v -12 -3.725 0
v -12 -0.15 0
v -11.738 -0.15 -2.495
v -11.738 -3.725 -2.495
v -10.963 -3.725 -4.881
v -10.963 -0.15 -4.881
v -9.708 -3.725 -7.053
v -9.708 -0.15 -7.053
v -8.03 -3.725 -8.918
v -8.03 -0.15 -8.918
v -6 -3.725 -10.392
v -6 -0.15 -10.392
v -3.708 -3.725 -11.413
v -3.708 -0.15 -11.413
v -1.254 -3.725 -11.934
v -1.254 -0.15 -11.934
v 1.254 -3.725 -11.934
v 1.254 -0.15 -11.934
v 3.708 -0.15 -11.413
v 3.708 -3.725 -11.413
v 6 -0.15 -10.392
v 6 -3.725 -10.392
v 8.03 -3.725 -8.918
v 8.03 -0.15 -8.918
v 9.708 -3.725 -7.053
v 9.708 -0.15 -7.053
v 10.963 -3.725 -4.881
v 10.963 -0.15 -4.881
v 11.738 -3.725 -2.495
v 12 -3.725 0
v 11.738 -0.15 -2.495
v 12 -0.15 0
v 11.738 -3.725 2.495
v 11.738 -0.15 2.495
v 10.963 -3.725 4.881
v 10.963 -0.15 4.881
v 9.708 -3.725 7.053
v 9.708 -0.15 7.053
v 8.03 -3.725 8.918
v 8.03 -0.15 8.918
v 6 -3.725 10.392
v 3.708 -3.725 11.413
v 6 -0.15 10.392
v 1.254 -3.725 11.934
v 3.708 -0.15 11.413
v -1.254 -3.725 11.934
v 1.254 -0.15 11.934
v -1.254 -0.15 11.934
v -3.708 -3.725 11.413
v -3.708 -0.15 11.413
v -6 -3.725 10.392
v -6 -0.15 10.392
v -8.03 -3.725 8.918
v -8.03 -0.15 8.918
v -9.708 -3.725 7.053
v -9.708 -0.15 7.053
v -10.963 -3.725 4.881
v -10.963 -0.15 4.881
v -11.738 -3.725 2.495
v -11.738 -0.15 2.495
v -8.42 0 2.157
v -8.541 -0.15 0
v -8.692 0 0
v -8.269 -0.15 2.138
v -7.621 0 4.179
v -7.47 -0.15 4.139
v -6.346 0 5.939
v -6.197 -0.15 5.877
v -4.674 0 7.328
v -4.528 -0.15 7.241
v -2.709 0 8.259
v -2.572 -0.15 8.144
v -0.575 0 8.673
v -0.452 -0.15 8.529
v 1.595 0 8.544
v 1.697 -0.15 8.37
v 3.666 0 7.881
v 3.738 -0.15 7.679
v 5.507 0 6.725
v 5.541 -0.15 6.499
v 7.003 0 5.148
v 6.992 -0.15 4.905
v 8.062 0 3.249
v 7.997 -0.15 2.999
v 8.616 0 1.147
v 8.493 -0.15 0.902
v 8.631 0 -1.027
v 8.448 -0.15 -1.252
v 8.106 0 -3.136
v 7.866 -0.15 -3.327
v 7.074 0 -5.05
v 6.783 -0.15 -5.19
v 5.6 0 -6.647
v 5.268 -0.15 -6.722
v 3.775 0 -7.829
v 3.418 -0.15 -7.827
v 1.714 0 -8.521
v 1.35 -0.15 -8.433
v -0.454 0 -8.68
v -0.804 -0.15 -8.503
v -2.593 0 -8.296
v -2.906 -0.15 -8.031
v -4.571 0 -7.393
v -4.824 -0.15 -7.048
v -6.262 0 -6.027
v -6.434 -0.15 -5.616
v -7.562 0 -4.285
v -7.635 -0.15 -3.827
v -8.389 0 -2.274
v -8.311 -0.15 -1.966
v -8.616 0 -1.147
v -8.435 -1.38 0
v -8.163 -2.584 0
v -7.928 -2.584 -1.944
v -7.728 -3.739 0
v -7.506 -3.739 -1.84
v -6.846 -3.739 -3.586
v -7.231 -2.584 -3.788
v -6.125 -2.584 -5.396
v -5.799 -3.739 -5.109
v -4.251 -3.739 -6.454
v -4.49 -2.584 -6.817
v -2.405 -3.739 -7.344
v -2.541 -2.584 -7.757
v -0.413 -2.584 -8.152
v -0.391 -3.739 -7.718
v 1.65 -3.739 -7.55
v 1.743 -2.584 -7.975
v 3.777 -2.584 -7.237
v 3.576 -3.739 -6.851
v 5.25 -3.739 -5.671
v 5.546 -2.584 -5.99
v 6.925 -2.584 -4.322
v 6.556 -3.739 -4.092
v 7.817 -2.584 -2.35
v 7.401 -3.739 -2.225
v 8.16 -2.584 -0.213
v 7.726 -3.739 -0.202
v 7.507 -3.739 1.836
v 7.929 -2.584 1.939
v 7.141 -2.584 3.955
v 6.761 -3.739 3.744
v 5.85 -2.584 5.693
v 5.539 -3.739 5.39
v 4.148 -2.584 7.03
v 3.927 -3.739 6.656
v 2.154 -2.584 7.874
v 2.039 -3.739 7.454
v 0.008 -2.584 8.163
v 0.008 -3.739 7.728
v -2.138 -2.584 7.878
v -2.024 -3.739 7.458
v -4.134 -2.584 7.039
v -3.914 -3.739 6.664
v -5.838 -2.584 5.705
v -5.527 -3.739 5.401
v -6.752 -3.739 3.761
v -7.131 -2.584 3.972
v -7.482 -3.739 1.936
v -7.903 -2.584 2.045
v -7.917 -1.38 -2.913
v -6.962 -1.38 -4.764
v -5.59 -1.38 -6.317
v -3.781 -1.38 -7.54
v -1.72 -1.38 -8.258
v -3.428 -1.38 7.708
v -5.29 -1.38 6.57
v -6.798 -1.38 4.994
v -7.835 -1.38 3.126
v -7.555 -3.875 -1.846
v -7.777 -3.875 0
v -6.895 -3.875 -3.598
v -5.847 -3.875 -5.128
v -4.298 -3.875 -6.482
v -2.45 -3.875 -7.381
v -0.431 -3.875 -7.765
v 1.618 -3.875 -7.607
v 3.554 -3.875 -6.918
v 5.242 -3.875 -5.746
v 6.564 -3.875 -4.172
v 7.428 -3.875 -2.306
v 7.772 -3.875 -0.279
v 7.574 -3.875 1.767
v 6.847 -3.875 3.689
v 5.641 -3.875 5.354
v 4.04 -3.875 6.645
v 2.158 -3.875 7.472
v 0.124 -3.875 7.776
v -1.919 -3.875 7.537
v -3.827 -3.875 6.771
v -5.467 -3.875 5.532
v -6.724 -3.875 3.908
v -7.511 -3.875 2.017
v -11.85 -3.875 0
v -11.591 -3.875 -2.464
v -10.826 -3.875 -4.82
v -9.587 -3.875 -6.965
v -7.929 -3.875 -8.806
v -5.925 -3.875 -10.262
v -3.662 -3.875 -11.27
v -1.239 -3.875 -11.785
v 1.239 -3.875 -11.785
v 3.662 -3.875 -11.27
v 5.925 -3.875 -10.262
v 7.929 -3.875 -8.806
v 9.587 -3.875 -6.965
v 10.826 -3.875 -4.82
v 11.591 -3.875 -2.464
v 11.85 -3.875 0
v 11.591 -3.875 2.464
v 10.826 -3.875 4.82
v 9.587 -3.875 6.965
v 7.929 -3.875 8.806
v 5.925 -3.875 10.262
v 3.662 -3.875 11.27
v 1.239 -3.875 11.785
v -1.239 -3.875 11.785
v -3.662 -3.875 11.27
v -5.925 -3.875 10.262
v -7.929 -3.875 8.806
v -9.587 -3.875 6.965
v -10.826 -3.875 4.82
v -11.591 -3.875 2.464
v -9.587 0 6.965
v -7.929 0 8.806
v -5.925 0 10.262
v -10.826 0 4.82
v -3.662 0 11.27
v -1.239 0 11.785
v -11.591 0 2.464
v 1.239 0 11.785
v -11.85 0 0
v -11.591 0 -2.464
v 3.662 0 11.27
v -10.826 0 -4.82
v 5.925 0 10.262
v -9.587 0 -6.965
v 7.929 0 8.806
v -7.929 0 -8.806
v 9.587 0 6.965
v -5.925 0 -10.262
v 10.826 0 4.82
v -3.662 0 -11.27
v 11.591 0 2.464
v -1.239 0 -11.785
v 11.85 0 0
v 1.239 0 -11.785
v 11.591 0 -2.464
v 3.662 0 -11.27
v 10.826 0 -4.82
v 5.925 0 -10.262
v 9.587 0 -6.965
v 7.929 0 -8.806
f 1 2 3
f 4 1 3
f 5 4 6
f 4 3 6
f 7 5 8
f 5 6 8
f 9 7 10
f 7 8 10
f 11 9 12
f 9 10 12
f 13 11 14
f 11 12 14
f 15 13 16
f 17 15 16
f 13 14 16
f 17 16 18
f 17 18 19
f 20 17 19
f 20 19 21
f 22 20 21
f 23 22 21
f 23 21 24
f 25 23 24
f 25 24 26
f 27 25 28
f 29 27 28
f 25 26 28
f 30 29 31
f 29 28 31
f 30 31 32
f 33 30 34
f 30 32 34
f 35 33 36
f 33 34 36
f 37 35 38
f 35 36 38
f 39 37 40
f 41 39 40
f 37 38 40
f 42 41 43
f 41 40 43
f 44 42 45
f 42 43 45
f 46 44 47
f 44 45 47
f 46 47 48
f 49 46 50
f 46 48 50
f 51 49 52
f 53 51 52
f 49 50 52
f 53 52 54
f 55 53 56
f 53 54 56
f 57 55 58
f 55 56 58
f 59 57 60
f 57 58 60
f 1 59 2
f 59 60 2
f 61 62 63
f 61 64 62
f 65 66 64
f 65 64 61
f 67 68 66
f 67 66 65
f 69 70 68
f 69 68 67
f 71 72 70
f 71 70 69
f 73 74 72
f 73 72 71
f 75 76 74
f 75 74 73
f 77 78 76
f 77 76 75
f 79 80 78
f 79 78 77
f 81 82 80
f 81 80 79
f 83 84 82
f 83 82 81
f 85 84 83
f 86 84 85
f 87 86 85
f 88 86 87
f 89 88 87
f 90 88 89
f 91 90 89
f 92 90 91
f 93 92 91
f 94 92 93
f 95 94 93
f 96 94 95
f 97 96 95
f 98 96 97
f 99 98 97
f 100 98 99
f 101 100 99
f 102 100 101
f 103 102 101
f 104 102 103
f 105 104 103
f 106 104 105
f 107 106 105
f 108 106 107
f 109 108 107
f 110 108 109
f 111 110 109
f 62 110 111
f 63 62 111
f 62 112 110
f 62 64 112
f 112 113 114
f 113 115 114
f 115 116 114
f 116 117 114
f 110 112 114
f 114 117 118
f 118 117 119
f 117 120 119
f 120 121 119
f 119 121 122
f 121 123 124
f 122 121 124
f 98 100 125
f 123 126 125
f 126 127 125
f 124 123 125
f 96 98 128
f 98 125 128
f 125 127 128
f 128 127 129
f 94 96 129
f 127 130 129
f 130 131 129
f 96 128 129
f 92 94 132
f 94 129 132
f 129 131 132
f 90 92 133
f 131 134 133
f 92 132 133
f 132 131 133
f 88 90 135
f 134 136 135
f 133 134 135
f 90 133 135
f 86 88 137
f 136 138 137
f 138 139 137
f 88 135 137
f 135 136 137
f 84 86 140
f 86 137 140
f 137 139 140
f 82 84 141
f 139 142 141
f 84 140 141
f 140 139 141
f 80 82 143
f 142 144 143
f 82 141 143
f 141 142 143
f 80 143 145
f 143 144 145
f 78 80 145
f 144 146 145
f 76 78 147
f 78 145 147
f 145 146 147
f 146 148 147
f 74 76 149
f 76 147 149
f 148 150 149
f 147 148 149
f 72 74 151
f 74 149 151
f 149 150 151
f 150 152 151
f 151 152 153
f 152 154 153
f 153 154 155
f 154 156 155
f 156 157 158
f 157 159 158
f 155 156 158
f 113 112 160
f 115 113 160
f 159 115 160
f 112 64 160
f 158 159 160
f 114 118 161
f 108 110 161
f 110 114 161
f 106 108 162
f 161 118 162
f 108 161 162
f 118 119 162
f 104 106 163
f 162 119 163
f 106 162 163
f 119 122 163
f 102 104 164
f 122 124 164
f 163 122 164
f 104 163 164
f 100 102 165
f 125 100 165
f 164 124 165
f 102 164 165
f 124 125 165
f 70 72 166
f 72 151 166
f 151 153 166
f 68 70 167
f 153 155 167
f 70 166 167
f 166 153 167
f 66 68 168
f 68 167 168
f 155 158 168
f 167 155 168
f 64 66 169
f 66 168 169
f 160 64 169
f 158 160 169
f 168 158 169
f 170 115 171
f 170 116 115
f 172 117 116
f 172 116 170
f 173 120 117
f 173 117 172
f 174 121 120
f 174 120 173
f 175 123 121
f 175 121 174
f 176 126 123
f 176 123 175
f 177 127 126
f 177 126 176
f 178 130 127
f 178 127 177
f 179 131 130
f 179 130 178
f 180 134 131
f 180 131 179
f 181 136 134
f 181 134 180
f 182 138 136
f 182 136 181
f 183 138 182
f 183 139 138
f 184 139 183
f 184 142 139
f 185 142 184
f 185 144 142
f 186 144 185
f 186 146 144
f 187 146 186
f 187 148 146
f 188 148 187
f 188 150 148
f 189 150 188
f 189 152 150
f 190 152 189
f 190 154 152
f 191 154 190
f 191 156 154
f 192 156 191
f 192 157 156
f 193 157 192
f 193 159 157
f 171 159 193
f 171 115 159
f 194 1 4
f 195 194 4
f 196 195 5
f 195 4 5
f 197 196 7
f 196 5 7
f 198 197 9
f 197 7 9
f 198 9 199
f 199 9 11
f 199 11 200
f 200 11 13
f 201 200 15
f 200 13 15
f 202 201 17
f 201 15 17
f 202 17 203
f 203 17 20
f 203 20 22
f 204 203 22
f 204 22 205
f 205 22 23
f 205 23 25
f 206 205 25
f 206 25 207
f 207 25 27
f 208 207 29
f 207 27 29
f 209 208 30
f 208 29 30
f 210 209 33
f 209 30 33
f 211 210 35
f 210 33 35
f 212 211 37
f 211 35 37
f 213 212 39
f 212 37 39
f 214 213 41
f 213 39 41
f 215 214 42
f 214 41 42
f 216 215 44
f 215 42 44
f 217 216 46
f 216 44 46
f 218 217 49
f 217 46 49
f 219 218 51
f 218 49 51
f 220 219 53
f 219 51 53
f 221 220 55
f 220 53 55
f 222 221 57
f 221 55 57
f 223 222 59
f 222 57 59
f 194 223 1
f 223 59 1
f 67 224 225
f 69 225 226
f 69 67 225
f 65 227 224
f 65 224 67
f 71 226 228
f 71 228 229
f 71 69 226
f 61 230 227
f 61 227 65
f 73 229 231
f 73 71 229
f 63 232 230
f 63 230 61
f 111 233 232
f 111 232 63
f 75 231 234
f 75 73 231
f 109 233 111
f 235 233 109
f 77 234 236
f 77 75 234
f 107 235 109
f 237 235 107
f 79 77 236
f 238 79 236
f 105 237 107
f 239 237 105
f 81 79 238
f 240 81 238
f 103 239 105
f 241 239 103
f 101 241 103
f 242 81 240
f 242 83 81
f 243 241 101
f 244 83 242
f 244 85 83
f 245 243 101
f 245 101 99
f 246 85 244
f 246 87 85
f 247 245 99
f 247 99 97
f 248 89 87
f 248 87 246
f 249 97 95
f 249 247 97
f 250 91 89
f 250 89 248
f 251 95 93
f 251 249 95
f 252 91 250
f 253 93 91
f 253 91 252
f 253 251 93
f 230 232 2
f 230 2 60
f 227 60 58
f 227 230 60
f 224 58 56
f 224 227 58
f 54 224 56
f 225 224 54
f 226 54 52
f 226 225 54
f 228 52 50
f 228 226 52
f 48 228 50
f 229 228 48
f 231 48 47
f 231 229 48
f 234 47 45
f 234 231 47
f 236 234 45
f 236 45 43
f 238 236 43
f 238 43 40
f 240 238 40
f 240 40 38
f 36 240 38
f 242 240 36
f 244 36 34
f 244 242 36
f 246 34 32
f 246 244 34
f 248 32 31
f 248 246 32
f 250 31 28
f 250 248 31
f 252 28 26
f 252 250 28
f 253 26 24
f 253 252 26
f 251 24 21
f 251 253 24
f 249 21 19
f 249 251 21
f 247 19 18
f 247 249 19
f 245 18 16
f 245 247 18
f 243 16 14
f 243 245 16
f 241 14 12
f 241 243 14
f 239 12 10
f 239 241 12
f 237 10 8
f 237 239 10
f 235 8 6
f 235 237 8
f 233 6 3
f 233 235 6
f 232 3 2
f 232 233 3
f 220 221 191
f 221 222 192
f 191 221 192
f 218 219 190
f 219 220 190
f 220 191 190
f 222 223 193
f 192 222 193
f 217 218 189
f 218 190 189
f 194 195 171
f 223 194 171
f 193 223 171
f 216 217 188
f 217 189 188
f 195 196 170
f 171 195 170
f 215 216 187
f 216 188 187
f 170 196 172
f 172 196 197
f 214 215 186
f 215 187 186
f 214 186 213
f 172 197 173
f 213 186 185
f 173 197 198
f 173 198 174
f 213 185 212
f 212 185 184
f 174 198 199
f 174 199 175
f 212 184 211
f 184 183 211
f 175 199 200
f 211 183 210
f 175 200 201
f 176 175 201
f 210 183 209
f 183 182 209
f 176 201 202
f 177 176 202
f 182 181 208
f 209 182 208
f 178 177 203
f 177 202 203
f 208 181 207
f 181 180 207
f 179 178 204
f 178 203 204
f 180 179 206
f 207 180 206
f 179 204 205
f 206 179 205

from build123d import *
from OCP.BRepFilletAPI import BRepFilletAPI_MakeChamfer

# Parameters (mm, degrees)
CUT_EXTRUDE1_DEPTH      = 18.407344018
CUT_EXTRUDE1_DEPTH_BACK = 18.407344018
SKETCH3_W               = 25.396980305
SKETCH3_H               = 7.254542424
CHAMFER1_SIZE           = 0.15
CHAMFER1_SIZE2          = 0.112518034


with BuildPart() as part:
    # Sketch2 → Revolve1 (revolve)
    with BuildSketch(Plane.XY):
        with BuildLine():
            Line((-7.664872763, -3.875), (-12, -3.875))
            Line((-12, -3.875), (-12, 3.875))
            Line((-12, 3.875), (-7.664872763, 3.875))
            ThreePointArc((-7.664872763, 3.875), (-8.541796068, 0), (-7.664872763, -3.875))
        make_face()
    revolve(axis=Axis((0, 6, 0), (0, -1, 0)))

    # Sketch3 → Cut-Extrude1 (cut, two sides: drawn at the far end of the back side and taken through both)
    with BuildSketch(Plane.XY.offset(-CUT_EXTRUDE1_DEPTH_BACK)):
        with Locations((0.698490153, 3.627271212)):
            Rectangle(SKETCH3_W, SKETCH3_H)
    extrude(amount=CUT_EXTRUDE1_DEPTH + CUT_EXTRUDE1_DEPTH_BACK, mode=Mode.SUBTRACT)

    # Chamfer1: one chamfer whose edges measure the first distance from different faces: ONE call of the kernel's chamfer builder (chamfer() names one face for all edges)
    chamfer1_edges_1 = [part.edges().sort_by_distance(p)[0] for p in [
        (12, 0, 0),
        (8.541796068, 0, -5e-09),
        (12, -3.875, 0),
    ]]
    chamfer1_edges_2 = [part.edges().sort_by_distance(p)[0] for p in [
        (7.664872763, -3.875, 0),
    ]]
    chamfer1_side_2 = [part.faces().sort_by_distance(p)[0] for p in [
        (8.31982803, -1.986493109, 0),
    ]]
    chamfer1 = BRepFilletAPI_MakeChamfer(part.part.solid().wrapped)
    for e in chamfer1_edges_1:
        chamfer1.Add(CHAMFER1_SIZE, e.wrapped)
    for e in chamfer1_edges_2:
        chamfer1.Add(CHAMFER1_SIZE, CHAMFER1_SIZE2, e.wrapped, chamfer1_side_2[0].wrapped)  # the first distance lies on this face
    add(Compound.cast(chamfer1.Shape()), mode=Mode.REPLACE)


solid = part.part
